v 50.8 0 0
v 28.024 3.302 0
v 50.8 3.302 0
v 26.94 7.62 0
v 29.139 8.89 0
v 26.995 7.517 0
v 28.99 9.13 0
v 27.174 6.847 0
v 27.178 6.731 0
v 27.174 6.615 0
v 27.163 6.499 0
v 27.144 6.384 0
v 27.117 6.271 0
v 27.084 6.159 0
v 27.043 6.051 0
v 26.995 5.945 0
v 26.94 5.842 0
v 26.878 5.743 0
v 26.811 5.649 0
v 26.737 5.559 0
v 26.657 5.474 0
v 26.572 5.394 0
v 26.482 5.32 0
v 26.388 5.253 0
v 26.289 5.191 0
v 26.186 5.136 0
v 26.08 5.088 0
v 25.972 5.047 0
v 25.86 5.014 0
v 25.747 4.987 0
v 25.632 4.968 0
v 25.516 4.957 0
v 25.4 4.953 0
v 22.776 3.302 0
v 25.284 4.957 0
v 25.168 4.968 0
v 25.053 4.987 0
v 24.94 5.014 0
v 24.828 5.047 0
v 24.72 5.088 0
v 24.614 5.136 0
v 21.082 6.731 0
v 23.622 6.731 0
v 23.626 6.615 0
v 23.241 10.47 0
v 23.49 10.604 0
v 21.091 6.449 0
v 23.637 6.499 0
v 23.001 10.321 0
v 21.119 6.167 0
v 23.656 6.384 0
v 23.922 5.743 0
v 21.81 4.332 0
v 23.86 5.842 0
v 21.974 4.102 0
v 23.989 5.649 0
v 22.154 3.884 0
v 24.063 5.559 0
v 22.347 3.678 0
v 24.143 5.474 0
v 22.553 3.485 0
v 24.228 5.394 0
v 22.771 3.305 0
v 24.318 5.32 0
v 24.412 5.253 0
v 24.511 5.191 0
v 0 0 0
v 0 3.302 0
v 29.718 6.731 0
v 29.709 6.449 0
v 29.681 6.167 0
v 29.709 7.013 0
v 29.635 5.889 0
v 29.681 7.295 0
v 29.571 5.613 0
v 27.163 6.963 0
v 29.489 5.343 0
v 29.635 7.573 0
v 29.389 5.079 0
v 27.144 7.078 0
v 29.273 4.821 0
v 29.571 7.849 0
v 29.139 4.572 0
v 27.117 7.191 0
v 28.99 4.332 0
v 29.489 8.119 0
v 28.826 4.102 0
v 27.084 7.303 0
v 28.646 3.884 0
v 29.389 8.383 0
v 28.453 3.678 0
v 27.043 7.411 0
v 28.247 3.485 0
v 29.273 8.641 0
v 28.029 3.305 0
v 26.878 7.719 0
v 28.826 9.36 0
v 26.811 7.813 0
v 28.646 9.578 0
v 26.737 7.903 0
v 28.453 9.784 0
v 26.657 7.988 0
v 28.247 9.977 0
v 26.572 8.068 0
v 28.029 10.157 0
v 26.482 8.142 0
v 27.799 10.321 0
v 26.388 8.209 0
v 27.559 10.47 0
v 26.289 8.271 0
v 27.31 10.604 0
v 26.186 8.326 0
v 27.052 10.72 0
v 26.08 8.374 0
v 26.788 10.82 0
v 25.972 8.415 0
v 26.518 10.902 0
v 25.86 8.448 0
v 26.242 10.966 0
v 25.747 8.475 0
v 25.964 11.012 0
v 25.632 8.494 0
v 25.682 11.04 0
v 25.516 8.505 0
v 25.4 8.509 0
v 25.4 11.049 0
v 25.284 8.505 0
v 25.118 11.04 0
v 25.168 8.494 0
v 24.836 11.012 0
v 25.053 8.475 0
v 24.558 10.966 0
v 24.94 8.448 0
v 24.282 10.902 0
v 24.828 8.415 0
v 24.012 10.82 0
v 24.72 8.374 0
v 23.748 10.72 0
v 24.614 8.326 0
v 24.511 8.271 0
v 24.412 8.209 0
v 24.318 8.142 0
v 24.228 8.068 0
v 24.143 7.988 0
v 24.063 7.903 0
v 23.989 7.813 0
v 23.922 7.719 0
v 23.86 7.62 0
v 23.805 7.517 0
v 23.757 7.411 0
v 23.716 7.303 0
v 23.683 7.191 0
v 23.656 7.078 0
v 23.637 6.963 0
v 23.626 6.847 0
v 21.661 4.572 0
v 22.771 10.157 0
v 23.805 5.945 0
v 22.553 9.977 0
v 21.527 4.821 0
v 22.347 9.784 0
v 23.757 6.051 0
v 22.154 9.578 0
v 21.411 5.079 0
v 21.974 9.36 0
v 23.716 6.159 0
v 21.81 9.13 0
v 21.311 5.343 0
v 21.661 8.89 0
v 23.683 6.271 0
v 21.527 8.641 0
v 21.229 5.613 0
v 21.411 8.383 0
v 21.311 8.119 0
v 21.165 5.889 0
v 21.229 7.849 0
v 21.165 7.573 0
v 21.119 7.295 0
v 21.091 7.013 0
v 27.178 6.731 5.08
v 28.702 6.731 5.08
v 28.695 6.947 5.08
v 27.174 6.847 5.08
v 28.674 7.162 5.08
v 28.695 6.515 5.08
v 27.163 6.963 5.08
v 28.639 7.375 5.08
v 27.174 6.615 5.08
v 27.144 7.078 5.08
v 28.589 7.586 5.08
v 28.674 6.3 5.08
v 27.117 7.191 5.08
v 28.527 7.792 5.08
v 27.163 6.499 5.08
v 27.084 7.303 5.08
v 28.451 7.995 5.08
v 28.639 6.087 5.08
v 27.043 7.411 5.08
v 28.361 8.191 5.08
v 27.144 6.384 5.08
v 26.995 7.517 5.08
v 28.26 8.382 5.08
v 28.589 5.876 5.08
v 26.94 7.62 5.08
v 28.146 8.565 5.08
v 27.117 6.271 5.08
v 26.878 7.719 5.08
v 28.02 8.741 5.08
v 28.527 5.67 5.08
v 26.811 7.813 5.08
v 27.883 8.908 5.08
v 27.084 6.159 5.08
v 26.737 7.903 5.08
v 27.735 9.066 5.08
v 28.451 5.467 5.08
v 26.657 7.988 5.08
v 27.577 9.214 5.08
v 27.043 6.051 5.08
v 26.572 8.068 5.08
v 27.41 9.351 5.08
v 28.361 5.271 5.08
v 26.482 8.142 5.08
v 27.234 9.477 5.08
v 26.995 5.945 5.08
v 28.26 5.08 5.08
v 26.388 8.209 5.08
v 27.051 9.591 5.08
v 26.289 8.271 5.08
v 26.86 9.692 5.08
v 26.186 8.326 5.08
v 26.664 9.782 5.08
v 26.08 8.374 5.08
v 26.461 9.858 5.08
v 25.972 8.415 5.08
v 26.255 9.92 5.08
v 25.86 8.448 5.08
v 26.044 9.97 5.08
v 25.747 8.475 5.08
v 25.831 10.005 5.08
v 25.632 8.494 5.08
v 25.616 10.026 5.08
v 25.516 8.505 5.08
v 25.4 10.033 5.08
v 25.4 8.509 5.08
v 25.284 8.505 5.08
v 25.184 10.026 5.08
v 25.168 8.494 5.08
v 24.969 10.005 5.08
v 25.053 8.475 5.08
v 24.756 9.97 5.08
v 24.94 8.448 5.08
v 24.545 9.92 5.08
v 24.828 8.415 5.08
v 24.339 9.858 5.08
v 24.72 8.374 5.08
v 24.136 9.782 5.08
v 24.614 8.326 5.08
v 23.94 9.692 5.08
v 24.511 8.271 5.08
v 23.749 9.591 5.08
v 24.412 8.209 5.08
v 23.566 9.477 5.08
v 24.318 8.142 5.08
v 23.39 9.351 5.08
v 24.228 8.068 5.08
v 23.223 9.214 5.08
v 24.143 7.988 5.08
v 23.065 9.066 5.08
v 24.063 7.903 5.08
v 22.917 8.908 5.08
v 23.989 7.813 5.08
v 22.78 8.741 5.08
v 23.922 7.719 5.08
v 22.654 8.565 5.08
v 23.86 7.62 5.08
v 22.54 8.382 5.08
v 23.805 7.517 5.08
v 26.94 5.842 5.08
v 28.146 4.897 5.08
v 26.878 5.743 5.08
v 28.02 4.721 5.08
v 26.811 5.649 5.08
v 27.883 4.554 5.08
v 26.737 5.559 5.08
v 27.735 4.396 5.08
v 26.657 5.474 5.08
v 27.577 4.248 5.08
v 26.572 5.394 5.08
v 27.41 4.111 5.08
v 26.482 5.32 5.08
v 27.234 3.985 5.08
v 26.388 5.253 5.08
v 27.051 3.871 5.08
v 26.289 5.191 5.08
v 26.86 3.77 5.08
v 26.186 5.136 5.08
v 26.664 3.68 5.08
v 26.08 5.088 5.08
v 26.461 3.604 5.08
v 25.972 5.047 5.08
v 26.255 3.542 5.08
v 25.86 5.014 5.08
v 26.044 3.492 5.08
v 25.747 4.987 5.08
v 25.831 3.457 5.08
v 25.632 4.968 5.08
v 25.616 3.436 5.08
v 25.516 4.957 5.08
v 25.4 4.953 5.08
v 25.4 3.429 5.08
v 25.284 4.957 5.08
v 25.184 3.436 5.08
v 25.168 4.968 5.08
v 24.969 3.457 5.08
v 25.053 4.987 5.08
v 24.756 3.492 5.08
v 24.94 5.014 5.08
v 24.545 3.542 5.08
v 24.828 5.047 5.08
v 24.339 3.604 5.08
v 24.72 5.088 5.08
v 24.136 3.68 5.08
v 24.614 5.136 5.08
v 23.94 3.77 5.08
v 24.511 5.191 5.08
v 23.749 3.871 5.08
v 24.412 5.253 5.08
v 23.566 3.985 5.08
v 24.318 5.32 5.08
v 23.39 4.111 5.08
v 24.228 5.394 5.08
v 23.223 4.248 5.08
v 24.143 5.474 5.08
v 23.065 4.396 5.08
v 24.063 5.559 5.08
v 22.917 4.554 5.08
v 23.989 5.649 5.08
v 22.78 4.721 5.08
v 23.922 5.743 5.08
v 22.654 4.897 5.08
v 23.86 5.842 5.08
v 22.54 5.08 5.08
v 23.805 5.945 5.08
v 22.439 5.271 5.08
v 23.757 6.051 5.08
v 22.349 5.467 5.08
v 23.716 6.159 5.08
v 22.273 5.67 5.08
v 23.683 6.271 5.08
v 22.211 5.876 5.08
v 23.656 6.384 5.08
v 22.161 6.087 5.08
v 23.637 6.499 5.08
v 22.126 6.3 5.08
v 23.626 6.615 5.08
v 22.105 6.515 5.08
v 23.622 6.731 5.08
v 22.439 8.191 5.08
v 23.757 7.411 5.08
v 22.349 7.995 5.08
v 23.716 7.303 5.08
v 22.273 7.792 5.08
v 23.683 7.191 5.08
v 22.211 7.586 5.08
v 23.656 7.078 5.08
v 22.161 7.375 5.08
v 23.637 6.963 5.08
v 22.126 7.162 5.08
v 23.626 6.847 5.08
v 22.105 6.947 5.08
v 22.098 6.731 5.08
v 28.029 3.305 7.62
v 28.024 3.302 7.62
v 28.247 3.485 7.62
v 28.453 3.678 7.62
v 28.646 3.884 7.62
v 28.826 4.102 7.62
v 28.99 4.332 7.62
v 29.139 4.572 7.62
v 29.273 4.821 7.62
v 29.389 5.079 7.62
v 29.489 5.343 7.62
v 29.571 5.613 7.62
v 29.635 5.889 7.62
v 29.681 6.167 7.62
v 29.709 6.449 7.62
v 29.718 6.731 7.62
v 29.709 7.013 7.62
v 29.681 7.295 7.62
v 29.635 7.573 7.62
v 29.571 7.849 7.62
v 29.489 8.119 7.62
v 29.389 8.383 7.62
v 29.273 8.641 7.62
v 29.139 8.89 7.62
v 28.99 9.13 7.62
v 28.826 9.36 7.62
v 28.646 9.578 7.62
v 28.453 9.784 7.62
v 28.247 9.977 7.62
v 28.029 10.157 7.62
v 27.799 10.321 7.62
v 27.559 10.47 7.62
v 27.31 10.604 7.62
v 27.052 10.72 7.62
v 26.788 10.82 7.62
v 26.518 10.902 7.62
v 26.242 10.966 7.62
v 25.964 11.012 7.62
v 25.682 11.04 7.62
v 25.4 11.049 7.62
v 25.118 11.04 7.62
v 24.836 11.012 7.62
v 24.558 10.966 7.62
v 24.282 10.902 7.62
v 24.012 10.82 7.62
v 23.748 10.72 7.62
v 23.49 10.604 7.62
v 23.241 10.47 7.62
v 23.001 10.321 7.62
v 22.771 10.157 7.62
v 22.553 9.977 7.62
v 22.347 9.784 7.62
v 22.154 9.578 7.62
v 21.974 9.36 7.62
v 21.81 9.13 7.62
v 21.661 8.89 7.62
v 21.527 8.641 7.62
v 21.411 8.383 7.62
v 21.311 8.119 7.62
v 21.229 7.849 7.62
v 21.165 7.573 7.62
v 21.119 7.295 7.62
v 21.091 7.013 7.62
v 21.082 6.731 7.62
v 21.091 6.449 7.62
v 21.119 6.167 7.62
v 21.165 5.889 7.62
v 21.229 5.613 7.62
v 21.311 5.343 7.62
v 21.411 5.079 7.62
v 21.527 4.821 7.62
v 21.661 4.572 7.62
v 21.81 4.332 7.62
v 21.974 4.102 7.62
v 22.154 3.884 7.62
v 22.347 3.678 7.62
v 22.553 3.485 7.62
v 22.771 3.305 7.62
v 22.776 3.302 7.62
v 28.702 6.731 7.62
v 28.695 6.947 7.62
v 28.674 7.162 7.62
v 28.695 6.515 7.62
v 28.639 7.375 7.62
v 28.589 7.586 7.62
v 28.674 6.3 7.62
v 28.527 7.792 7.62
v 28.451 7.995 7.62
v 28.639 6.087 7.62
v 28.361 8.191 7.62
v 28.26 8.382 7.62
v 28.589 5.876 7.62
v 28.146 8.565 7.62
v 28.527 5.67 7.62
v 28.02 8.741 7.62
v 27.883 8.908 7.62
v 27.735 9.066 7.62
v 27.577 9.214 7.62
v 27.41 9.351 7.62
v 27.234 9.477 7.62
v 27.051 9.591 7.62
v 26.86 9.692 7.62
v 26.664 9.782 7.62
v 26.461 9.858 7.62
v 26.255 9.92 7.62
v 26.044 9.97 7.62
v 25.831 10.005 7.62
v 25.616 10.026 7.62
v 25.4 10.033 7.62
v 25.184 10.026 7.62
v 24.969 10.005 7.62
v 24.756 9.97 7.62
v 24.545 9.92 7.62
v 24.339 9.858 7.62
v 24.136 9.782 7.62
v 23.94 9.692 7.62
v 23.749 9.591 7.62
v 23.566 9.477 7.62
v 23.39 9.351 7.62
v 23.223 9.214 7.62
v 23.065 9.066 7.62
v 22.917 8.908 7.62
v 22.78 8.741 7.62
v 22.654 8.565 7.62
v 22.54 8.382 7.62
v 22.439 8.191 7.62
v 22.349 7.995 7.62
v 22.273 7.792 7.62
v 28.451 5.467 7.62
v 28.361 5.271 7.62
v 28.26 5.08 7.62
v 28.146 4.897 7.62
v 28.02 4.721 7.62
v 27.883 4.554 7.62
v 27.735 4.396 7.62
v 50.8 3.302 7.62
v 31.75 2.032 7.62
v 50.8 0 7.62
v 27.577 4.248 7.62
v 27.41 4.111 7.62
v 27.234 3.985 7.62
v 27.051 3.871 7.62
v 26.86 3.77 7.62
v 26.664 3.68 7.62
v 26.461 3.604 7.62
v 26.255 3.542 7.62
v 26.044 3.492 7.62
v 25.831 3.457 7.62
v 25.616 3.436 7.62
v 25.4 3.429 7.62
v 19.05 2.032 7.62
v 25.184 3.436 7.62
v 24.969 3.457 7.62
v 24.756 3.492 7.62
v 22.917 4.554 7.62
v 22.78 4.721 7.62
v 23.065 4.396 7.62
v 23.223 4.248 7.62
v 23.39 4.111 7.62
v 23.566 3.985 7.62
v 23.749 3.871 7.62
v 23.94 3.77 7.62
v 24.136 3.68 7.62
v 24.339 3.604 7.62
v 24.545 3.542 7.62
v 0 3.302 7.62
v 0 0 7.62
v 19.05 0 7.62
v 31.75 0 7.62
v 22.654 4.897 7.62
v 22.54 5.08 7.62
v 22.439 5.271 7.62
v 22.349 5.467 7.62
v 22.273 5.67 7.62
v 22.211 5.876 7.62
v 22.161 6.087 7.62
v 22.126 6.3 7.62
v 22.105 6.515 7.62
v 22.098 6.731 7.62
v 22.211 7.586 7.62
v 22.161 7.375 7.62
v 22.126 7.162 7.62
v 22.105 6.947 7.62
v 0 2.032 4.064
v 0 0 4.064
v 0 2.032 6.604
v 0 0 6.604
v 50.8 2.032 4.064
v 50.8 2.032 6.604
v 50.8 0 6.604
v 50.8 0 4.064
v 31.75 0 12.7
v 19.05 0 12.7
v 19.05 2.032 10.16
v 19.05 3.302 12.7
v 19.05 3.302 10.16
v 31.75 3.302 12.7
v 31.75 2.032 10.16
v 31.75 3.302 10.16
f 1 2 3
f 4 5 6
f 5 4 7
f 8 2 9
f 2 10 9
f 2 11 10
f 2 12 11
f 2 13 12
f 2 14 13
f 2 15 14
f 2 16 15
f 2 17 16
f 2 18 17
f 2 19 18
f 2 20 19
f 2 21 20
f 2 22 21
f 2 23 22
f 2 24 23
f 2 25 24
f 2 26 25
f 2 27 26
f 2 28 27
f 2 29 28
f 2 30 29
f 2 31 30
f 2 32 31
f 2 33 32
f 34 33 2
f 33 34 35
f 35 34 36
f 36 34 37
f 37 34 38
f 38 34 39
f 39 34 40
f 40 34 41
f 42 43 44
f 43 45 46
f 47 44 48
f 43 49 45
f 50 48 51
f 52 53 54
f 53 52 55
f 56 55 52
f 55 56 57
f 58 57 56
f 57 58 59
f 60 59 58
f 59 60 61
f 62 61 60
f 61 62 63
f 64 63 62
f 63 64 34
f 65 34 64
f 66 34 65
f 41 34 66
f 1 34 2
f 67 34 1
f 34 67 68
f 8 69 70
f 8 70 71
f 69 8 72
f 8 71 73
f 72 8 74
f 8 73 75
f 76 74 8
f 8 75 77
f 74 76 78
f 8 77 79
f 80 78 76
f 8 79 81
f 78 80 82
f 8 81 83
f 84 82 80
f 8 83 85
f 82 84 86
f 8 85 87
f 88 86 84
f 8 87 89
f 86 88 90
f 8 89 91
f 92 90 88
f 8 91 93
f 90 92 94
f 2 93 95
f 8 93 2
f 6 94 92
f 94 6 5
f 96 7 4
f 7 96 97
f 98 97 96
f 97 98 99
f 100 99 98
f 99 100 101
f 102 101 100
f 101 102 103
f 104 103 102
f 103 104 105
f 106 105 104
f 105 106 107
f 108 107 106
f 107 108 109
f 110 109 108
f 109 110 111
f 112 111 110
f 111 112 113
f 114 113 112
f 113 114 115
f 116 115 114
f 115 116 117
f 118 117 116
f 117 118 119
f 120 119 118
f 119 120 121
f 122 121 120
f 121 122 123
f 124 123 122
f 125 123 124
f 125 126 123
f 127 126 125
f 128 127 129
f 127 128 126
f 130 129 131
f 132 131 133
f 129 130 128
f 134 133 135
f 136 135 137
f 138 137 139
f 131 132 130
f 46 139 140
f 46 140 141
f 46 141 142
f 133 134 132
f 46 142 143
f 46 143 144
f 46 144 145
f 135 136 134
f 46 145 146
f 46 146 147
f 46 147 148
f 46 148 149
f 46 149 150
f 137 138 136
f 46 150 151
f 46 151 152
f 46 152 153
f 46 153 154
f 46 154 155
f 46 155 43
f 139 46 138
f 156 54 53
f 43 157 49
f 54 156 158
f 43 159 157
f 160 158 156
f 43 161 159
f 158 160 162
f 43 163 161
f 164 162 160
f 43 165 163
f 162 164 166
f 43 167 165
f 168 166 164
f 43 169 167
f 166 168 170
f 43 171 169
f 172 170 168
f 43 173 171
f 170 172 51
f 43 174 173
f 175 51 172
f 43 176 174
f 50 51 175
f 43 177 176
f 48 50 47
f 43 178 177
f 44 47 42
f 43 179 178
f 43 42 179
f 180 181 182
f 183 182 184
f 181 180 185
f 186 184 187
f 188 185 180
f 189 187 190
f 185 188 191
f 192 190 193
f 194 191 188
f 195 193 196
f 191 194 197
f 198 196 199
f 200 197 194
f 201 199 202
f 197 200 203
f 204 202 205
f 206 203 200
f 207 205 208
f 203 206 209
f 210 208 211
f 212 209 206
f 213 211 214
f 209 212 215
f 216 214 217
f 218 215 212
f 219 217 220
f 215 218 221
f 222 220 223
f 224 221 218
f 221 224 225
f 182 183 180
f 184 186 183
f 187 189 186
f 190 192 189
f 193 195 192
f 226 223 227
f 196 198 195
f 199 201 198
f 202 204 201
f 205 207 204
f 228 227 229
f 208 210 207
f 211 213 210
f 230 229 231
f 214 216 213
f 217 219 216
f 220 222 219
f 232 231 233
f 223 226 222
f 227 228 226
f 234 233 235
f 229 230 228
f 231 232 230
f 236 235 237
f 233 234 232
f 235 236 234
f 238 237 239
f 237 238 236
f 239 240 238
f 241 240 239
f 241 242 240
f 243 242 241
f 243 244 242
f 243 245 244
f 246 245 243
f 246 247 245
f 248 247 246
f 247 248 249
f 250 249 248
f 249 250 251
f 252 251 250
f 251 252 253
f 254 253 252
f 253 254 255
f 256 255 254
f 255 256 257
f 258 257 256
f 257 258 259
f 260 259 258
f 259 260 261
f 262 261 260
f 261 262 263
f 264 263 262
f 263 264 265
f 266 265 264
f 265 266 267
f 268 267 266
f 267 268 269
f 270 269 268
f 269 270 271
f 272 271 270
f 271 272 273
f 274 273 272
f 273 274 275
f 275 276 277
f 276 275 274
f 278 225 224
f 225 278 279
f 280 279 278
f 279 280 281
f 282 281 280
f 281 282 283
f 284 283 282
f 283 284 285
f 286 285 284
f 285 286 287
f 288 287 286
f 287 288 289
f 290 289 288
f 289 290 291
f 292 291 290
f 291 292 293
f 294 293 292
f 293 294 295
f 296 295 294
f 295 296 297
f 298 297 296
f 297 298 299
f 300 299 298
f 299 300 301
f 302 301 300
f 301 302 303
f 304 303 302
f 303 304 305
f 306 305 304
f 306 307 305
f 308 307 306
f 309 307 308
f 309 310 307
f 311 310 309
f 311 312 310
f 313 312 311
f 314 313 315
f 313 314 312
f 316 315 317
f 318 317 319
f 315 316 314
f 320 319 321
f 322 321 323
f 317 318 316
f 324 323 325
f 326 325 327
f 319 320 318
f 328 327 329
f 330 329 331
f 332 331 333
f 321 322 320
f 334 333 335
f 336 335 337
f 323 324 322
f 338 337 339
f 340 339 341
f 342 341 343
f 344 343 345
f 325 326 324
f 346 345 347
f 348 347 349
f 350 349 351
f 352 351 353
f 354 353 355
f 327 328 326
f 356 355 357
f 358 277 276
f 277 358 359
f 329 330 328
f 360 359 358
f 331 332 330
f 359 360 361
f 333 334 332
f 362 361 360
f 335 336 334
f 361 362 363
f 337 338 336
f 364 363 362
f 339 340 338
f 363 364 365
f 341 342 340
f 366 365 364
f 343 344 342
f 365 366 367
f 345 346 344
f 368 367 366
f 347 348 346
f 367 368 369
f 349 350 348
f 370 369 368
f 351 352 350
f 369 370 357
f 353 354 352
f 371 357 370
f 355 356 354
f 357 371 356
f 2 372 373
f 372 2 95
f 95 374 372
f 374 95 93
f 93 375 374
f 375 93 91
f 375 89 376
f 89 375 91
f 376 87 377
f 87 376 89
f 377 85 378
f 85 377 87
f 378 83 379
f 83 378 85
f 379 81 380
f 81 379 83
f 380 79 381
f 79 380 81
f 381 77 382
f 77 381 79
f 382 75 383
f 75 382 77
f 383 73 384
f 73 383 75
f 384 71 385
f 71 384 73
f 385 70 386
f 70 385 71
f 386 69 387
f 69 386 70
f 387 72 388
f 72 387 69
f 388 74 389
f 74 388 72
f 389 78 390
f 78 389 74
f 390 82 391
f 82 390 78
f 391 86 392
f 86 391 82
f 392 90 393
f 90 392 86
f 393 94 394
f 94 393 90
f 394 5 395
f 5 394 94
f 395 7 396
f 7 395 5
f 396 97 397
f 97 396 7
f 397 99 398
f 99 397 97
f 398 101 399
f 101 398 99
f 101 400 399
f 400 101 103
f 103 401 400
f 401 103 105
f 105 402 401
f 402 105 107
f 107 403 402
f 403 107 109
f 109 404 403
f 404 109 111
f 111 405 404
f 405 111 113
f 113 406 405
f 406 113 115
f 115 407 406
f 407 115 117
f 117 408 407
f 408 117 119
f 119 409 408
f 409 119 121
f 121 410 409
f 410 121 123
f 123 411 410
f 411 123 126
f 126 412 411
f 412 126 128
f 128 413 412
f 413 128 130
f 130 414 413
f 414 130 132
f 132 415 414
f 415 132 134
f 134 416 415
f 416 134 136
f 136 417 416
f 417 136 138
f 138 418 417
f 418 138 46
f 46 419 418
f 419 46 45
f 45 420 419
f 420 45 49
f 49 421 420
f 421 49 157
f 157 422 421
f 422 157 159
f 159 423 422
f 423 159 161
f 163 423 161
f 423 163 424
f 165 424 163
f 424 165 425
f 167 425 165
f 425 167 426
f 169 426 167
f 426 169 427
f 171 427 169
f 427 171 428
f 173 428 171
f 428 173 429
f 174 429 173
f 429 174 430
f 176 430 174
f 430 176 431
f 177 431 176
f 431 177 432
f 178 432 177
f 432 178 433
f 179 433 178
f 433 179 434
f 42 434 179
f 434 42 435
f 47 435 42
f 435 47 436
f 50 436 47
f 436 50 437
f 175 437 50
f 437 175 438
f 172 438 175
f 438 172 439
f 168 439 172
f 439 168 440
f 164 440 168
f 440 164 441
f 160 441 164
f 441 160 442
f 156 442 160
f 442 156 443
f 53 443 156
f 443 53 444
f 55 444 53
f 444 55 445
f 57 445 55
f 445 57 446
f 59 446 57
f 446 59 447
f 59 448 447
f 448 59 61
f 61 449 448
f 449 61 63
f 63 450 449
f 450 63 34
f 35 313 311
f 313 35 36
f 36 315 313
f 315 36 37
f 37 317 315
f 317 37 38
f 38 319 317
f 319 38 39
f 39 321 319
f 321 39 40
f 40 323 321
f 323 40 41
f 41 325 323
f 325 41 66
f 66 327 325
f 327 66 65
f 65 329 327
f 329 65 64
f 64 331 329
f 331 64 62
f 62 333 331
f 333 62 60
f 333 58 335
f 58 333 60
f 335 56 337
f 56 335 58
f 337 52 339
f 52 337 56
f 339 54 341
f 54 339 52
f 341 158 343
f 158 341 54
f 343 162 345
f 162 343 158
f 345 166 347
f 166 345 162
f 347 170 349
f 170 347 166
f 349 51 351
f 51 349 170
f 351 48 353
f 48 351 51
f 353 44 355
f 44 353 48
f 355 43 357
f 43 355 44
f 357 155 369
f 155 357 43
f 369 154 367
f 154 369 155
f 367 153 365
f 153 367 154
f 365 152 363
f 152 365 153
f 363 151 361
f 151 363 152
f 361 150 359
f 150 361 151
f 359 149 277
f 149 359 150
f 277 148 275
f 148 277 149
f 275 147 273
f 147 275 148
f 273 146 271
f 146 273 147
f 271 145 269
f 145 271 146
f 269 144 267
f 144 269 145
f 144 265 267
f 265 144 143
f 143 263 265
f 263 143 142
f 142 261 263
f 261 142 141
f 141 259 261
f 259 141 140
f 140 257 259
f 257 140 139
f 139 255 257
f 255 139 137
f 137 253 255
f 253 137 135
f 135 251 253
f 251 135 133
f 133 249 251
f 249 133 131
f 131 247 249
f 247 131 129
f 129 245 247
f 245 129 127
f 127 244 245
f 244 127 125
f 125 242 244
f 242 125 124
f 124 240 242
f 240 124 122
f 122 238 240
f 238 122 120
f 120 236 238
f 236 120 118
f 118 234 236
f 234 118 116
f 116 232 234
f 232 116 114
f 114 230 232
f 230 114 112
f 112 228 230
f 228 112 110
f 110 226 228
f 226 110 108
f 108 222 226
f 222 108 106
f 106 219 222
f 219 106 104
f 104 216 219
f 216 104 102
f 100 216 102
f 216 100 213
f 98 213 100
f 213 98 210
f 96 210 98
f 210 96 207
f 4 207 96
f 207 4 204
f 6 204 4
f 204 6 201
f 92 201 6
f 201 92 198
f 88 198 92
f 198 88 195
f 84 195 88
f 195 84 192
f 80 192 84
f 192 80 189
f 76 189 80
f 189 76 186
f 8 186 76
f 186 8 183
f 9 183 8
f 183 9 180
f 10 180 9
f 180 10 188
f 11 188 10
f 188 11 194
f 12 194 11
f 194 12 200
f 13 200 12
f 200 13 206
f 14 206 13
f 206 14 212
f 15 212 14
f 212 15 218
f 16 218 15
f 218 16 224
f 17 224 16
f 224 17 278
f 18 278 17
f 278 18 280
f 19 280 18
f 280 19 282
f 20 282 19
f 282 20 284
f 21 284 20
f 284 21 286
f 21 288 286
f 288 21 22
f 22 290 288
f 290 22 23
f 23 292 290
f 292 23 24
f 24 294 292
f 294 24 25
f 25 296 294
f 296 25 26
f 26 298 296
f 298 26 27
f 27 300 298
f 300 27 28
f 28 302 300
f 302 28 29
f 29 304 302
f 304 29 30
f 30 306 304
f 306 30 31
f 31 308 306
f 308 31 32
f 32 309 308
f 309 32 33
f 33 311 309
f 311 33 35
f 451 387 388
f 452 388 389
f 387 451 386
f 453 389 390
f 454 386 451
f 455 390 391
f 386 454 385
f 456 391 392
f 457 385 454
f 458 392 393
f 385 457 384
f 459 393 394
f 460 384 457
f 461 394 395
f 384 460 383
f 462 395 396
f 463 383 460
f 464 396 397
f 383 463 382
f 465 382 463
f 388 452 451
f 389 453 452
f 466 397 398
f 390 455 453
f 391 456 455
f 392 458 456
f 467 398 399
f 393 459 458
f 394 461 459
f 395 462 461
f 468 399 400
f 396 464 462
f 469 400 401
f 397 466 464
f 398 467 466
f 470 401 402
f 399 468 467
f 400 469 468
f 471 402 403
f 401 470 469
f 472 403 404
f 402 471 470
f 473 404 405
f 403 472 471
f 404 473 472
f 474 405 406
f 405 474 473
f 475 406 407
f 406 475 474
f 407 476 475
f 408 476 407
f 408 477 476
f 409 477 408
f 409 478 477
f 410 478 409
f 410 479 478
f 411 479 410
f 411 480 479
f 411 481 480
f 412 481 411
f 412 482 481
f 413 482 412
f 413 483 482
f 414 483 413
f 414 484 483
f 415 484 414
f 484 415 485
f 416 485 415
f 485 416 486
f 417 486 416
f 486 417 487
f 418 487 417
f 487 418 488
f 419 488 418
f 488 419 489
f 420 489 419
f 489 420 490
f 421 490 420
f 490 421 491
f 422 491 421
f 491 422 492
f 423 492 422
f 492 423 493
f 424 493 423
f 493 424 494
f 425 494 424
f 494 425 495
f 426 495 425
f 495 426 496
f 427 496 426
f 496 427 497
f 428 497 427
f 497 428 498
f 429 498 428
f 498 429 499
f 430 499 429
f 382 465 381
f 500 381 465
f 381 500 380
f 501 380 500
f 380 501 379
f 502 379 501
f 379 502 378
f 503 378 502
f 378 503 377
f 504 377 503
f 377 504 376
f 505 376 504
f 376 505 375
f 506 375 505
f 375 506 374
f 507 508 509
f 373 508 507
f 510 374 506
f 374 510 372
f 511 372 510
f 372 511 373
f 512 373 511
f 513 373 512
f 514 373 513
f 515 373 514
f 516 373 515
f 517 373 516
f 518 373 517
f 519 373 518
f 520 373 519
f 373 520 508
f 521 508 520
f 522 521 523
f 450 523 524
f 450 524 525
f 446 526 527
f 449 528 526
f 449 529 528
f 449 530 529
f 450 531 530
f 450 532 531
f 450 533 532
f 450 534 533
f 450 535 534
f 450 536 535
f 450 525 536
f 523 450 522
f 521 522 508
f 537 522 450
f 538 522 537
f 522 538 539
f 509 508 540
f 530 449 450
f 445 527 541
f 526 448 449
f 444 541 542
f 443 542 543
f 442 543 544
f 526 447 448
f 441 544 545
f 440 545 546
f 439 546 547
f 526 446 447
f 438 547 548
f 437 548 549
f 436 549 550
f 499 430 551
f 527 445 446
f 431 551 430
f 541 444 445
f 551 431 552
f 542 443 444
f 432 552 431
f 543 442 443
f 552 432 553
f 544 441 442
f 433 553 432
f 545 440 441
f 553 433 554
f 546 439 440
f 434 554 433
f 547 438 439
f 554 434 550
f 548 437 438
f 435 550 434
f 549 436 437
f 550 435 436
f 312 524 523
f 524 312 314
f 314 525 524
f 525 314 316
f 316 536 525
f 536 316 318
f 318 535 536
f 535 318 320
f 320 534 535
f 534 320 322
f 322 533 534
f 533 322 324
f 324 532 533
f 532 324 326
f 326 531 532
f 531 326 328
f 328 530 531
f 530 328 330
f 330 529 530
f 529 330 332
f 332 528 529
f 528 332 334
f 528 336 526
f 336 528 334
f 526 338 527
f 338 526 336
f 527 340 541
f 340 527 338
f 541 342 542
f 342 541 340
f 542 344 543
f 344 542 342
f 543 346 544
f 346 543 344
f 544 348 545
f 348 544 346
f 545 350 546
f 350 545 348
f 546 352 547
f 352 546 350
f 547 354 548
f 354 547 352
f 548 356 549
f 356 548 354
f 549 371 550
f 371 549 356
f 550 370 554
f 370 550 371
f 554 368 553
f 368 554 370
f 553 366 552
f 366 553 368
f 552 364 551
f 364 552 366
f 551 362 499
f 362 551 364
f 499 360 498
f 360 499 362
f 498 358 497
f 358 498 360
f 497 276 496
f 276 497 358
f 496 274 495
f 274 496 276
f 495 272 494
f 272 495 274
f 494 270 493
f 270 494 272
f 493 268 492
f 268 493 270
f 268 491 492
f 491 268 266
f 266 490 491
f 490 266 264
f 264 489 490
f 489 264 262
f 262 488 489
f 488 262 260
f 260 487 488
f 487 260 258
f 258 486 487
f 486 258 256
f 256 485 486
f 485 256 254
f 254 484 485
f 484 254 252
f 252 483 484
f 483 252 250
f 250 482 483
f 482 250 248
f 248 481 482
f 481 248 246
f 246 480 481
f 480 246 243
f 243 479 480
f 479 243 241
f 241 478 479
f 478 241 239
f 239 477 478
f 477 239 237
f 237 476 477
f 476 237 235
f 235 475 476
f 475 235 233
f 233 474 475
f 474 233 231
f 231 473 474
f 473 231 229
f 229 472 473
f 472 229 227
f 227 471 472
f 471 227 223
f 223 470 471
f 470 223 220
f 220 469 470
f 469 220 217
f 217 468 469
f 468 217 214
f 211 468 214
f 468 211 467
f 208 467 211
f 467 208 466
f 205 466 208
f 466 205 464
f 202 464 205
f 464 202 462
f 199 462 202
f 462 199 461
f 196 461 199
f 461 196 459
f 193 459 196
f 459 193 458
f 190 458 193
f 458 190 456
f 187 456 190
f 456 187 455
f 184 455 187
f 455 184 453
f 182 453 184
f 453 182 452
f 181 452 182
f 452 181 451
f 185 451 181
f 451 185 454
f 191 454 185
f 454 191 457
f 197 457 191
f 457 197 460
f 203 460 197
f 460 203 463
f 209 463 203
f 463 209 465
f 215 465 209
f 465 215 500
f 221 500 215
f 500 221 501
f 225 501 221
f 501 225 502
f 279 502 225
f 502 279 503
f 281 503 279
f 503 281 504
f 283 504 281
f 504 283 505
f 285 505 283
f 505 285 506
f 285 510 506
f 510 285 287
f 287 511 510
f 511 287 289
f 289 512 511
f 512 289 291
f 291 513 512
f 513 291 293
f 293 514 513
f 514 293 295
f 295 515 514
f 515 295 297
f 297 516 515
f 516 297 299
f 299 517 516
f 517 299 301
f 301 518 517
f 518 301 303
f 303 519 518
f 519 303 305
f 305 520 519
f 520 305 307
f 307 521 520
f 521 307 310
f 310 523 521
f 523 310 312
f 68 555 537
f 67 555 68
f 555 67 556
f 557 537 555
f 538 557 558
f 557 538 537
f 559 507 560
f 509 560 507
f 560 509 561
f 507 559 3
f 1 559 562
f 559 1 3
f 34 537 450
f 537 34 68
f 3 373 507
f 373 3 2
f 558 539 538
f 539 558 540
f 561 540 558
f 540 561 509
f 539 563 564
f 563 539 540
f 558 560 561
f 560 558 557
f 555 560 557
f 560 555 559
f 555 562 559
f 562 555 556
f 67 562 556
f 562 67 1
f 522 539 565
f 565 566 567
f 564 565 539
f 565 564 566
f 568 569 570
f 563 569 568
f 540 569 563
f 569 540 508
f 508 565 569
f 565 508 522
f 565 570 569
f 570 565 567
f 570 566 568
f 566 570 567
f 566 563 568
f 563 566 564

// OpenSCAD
ViewScale = [0.0254, 0.0254, 0.0254];


module slot()
{
    difference() {
    square([130, 300]);
    translate([0, 160, 0])
    square([80, 100]);
    }
}

module bandMount()
{
    difference() {
    square([130, 200]);
    translate([0, 100, 0])
    square([50, 100]);
    }
}

module screwMount()
{
    linear_extrude(200)
    difference() {
    circle(170, $fn=96);
    circle(70, $fn=96);
    }
    translate([0, 0, 200])
    linear_extrude(100)
    difference() {
    circle(170, $fn=96);
    circle(130, $fn=96);
    }
}

module boardHolder()
{
    rotate([90, 0, 90])
    linear_extrude(2000)
    slot();
    translate([1000, 130+150-15, 0])
    screwMount();
    translate([1000-250, 130, 300+200])
    rotate([90, 180, 90])
    linear_extrude(500)
    bandMount();
}

scale(ViewScale)
{
    boardHolder();
}
